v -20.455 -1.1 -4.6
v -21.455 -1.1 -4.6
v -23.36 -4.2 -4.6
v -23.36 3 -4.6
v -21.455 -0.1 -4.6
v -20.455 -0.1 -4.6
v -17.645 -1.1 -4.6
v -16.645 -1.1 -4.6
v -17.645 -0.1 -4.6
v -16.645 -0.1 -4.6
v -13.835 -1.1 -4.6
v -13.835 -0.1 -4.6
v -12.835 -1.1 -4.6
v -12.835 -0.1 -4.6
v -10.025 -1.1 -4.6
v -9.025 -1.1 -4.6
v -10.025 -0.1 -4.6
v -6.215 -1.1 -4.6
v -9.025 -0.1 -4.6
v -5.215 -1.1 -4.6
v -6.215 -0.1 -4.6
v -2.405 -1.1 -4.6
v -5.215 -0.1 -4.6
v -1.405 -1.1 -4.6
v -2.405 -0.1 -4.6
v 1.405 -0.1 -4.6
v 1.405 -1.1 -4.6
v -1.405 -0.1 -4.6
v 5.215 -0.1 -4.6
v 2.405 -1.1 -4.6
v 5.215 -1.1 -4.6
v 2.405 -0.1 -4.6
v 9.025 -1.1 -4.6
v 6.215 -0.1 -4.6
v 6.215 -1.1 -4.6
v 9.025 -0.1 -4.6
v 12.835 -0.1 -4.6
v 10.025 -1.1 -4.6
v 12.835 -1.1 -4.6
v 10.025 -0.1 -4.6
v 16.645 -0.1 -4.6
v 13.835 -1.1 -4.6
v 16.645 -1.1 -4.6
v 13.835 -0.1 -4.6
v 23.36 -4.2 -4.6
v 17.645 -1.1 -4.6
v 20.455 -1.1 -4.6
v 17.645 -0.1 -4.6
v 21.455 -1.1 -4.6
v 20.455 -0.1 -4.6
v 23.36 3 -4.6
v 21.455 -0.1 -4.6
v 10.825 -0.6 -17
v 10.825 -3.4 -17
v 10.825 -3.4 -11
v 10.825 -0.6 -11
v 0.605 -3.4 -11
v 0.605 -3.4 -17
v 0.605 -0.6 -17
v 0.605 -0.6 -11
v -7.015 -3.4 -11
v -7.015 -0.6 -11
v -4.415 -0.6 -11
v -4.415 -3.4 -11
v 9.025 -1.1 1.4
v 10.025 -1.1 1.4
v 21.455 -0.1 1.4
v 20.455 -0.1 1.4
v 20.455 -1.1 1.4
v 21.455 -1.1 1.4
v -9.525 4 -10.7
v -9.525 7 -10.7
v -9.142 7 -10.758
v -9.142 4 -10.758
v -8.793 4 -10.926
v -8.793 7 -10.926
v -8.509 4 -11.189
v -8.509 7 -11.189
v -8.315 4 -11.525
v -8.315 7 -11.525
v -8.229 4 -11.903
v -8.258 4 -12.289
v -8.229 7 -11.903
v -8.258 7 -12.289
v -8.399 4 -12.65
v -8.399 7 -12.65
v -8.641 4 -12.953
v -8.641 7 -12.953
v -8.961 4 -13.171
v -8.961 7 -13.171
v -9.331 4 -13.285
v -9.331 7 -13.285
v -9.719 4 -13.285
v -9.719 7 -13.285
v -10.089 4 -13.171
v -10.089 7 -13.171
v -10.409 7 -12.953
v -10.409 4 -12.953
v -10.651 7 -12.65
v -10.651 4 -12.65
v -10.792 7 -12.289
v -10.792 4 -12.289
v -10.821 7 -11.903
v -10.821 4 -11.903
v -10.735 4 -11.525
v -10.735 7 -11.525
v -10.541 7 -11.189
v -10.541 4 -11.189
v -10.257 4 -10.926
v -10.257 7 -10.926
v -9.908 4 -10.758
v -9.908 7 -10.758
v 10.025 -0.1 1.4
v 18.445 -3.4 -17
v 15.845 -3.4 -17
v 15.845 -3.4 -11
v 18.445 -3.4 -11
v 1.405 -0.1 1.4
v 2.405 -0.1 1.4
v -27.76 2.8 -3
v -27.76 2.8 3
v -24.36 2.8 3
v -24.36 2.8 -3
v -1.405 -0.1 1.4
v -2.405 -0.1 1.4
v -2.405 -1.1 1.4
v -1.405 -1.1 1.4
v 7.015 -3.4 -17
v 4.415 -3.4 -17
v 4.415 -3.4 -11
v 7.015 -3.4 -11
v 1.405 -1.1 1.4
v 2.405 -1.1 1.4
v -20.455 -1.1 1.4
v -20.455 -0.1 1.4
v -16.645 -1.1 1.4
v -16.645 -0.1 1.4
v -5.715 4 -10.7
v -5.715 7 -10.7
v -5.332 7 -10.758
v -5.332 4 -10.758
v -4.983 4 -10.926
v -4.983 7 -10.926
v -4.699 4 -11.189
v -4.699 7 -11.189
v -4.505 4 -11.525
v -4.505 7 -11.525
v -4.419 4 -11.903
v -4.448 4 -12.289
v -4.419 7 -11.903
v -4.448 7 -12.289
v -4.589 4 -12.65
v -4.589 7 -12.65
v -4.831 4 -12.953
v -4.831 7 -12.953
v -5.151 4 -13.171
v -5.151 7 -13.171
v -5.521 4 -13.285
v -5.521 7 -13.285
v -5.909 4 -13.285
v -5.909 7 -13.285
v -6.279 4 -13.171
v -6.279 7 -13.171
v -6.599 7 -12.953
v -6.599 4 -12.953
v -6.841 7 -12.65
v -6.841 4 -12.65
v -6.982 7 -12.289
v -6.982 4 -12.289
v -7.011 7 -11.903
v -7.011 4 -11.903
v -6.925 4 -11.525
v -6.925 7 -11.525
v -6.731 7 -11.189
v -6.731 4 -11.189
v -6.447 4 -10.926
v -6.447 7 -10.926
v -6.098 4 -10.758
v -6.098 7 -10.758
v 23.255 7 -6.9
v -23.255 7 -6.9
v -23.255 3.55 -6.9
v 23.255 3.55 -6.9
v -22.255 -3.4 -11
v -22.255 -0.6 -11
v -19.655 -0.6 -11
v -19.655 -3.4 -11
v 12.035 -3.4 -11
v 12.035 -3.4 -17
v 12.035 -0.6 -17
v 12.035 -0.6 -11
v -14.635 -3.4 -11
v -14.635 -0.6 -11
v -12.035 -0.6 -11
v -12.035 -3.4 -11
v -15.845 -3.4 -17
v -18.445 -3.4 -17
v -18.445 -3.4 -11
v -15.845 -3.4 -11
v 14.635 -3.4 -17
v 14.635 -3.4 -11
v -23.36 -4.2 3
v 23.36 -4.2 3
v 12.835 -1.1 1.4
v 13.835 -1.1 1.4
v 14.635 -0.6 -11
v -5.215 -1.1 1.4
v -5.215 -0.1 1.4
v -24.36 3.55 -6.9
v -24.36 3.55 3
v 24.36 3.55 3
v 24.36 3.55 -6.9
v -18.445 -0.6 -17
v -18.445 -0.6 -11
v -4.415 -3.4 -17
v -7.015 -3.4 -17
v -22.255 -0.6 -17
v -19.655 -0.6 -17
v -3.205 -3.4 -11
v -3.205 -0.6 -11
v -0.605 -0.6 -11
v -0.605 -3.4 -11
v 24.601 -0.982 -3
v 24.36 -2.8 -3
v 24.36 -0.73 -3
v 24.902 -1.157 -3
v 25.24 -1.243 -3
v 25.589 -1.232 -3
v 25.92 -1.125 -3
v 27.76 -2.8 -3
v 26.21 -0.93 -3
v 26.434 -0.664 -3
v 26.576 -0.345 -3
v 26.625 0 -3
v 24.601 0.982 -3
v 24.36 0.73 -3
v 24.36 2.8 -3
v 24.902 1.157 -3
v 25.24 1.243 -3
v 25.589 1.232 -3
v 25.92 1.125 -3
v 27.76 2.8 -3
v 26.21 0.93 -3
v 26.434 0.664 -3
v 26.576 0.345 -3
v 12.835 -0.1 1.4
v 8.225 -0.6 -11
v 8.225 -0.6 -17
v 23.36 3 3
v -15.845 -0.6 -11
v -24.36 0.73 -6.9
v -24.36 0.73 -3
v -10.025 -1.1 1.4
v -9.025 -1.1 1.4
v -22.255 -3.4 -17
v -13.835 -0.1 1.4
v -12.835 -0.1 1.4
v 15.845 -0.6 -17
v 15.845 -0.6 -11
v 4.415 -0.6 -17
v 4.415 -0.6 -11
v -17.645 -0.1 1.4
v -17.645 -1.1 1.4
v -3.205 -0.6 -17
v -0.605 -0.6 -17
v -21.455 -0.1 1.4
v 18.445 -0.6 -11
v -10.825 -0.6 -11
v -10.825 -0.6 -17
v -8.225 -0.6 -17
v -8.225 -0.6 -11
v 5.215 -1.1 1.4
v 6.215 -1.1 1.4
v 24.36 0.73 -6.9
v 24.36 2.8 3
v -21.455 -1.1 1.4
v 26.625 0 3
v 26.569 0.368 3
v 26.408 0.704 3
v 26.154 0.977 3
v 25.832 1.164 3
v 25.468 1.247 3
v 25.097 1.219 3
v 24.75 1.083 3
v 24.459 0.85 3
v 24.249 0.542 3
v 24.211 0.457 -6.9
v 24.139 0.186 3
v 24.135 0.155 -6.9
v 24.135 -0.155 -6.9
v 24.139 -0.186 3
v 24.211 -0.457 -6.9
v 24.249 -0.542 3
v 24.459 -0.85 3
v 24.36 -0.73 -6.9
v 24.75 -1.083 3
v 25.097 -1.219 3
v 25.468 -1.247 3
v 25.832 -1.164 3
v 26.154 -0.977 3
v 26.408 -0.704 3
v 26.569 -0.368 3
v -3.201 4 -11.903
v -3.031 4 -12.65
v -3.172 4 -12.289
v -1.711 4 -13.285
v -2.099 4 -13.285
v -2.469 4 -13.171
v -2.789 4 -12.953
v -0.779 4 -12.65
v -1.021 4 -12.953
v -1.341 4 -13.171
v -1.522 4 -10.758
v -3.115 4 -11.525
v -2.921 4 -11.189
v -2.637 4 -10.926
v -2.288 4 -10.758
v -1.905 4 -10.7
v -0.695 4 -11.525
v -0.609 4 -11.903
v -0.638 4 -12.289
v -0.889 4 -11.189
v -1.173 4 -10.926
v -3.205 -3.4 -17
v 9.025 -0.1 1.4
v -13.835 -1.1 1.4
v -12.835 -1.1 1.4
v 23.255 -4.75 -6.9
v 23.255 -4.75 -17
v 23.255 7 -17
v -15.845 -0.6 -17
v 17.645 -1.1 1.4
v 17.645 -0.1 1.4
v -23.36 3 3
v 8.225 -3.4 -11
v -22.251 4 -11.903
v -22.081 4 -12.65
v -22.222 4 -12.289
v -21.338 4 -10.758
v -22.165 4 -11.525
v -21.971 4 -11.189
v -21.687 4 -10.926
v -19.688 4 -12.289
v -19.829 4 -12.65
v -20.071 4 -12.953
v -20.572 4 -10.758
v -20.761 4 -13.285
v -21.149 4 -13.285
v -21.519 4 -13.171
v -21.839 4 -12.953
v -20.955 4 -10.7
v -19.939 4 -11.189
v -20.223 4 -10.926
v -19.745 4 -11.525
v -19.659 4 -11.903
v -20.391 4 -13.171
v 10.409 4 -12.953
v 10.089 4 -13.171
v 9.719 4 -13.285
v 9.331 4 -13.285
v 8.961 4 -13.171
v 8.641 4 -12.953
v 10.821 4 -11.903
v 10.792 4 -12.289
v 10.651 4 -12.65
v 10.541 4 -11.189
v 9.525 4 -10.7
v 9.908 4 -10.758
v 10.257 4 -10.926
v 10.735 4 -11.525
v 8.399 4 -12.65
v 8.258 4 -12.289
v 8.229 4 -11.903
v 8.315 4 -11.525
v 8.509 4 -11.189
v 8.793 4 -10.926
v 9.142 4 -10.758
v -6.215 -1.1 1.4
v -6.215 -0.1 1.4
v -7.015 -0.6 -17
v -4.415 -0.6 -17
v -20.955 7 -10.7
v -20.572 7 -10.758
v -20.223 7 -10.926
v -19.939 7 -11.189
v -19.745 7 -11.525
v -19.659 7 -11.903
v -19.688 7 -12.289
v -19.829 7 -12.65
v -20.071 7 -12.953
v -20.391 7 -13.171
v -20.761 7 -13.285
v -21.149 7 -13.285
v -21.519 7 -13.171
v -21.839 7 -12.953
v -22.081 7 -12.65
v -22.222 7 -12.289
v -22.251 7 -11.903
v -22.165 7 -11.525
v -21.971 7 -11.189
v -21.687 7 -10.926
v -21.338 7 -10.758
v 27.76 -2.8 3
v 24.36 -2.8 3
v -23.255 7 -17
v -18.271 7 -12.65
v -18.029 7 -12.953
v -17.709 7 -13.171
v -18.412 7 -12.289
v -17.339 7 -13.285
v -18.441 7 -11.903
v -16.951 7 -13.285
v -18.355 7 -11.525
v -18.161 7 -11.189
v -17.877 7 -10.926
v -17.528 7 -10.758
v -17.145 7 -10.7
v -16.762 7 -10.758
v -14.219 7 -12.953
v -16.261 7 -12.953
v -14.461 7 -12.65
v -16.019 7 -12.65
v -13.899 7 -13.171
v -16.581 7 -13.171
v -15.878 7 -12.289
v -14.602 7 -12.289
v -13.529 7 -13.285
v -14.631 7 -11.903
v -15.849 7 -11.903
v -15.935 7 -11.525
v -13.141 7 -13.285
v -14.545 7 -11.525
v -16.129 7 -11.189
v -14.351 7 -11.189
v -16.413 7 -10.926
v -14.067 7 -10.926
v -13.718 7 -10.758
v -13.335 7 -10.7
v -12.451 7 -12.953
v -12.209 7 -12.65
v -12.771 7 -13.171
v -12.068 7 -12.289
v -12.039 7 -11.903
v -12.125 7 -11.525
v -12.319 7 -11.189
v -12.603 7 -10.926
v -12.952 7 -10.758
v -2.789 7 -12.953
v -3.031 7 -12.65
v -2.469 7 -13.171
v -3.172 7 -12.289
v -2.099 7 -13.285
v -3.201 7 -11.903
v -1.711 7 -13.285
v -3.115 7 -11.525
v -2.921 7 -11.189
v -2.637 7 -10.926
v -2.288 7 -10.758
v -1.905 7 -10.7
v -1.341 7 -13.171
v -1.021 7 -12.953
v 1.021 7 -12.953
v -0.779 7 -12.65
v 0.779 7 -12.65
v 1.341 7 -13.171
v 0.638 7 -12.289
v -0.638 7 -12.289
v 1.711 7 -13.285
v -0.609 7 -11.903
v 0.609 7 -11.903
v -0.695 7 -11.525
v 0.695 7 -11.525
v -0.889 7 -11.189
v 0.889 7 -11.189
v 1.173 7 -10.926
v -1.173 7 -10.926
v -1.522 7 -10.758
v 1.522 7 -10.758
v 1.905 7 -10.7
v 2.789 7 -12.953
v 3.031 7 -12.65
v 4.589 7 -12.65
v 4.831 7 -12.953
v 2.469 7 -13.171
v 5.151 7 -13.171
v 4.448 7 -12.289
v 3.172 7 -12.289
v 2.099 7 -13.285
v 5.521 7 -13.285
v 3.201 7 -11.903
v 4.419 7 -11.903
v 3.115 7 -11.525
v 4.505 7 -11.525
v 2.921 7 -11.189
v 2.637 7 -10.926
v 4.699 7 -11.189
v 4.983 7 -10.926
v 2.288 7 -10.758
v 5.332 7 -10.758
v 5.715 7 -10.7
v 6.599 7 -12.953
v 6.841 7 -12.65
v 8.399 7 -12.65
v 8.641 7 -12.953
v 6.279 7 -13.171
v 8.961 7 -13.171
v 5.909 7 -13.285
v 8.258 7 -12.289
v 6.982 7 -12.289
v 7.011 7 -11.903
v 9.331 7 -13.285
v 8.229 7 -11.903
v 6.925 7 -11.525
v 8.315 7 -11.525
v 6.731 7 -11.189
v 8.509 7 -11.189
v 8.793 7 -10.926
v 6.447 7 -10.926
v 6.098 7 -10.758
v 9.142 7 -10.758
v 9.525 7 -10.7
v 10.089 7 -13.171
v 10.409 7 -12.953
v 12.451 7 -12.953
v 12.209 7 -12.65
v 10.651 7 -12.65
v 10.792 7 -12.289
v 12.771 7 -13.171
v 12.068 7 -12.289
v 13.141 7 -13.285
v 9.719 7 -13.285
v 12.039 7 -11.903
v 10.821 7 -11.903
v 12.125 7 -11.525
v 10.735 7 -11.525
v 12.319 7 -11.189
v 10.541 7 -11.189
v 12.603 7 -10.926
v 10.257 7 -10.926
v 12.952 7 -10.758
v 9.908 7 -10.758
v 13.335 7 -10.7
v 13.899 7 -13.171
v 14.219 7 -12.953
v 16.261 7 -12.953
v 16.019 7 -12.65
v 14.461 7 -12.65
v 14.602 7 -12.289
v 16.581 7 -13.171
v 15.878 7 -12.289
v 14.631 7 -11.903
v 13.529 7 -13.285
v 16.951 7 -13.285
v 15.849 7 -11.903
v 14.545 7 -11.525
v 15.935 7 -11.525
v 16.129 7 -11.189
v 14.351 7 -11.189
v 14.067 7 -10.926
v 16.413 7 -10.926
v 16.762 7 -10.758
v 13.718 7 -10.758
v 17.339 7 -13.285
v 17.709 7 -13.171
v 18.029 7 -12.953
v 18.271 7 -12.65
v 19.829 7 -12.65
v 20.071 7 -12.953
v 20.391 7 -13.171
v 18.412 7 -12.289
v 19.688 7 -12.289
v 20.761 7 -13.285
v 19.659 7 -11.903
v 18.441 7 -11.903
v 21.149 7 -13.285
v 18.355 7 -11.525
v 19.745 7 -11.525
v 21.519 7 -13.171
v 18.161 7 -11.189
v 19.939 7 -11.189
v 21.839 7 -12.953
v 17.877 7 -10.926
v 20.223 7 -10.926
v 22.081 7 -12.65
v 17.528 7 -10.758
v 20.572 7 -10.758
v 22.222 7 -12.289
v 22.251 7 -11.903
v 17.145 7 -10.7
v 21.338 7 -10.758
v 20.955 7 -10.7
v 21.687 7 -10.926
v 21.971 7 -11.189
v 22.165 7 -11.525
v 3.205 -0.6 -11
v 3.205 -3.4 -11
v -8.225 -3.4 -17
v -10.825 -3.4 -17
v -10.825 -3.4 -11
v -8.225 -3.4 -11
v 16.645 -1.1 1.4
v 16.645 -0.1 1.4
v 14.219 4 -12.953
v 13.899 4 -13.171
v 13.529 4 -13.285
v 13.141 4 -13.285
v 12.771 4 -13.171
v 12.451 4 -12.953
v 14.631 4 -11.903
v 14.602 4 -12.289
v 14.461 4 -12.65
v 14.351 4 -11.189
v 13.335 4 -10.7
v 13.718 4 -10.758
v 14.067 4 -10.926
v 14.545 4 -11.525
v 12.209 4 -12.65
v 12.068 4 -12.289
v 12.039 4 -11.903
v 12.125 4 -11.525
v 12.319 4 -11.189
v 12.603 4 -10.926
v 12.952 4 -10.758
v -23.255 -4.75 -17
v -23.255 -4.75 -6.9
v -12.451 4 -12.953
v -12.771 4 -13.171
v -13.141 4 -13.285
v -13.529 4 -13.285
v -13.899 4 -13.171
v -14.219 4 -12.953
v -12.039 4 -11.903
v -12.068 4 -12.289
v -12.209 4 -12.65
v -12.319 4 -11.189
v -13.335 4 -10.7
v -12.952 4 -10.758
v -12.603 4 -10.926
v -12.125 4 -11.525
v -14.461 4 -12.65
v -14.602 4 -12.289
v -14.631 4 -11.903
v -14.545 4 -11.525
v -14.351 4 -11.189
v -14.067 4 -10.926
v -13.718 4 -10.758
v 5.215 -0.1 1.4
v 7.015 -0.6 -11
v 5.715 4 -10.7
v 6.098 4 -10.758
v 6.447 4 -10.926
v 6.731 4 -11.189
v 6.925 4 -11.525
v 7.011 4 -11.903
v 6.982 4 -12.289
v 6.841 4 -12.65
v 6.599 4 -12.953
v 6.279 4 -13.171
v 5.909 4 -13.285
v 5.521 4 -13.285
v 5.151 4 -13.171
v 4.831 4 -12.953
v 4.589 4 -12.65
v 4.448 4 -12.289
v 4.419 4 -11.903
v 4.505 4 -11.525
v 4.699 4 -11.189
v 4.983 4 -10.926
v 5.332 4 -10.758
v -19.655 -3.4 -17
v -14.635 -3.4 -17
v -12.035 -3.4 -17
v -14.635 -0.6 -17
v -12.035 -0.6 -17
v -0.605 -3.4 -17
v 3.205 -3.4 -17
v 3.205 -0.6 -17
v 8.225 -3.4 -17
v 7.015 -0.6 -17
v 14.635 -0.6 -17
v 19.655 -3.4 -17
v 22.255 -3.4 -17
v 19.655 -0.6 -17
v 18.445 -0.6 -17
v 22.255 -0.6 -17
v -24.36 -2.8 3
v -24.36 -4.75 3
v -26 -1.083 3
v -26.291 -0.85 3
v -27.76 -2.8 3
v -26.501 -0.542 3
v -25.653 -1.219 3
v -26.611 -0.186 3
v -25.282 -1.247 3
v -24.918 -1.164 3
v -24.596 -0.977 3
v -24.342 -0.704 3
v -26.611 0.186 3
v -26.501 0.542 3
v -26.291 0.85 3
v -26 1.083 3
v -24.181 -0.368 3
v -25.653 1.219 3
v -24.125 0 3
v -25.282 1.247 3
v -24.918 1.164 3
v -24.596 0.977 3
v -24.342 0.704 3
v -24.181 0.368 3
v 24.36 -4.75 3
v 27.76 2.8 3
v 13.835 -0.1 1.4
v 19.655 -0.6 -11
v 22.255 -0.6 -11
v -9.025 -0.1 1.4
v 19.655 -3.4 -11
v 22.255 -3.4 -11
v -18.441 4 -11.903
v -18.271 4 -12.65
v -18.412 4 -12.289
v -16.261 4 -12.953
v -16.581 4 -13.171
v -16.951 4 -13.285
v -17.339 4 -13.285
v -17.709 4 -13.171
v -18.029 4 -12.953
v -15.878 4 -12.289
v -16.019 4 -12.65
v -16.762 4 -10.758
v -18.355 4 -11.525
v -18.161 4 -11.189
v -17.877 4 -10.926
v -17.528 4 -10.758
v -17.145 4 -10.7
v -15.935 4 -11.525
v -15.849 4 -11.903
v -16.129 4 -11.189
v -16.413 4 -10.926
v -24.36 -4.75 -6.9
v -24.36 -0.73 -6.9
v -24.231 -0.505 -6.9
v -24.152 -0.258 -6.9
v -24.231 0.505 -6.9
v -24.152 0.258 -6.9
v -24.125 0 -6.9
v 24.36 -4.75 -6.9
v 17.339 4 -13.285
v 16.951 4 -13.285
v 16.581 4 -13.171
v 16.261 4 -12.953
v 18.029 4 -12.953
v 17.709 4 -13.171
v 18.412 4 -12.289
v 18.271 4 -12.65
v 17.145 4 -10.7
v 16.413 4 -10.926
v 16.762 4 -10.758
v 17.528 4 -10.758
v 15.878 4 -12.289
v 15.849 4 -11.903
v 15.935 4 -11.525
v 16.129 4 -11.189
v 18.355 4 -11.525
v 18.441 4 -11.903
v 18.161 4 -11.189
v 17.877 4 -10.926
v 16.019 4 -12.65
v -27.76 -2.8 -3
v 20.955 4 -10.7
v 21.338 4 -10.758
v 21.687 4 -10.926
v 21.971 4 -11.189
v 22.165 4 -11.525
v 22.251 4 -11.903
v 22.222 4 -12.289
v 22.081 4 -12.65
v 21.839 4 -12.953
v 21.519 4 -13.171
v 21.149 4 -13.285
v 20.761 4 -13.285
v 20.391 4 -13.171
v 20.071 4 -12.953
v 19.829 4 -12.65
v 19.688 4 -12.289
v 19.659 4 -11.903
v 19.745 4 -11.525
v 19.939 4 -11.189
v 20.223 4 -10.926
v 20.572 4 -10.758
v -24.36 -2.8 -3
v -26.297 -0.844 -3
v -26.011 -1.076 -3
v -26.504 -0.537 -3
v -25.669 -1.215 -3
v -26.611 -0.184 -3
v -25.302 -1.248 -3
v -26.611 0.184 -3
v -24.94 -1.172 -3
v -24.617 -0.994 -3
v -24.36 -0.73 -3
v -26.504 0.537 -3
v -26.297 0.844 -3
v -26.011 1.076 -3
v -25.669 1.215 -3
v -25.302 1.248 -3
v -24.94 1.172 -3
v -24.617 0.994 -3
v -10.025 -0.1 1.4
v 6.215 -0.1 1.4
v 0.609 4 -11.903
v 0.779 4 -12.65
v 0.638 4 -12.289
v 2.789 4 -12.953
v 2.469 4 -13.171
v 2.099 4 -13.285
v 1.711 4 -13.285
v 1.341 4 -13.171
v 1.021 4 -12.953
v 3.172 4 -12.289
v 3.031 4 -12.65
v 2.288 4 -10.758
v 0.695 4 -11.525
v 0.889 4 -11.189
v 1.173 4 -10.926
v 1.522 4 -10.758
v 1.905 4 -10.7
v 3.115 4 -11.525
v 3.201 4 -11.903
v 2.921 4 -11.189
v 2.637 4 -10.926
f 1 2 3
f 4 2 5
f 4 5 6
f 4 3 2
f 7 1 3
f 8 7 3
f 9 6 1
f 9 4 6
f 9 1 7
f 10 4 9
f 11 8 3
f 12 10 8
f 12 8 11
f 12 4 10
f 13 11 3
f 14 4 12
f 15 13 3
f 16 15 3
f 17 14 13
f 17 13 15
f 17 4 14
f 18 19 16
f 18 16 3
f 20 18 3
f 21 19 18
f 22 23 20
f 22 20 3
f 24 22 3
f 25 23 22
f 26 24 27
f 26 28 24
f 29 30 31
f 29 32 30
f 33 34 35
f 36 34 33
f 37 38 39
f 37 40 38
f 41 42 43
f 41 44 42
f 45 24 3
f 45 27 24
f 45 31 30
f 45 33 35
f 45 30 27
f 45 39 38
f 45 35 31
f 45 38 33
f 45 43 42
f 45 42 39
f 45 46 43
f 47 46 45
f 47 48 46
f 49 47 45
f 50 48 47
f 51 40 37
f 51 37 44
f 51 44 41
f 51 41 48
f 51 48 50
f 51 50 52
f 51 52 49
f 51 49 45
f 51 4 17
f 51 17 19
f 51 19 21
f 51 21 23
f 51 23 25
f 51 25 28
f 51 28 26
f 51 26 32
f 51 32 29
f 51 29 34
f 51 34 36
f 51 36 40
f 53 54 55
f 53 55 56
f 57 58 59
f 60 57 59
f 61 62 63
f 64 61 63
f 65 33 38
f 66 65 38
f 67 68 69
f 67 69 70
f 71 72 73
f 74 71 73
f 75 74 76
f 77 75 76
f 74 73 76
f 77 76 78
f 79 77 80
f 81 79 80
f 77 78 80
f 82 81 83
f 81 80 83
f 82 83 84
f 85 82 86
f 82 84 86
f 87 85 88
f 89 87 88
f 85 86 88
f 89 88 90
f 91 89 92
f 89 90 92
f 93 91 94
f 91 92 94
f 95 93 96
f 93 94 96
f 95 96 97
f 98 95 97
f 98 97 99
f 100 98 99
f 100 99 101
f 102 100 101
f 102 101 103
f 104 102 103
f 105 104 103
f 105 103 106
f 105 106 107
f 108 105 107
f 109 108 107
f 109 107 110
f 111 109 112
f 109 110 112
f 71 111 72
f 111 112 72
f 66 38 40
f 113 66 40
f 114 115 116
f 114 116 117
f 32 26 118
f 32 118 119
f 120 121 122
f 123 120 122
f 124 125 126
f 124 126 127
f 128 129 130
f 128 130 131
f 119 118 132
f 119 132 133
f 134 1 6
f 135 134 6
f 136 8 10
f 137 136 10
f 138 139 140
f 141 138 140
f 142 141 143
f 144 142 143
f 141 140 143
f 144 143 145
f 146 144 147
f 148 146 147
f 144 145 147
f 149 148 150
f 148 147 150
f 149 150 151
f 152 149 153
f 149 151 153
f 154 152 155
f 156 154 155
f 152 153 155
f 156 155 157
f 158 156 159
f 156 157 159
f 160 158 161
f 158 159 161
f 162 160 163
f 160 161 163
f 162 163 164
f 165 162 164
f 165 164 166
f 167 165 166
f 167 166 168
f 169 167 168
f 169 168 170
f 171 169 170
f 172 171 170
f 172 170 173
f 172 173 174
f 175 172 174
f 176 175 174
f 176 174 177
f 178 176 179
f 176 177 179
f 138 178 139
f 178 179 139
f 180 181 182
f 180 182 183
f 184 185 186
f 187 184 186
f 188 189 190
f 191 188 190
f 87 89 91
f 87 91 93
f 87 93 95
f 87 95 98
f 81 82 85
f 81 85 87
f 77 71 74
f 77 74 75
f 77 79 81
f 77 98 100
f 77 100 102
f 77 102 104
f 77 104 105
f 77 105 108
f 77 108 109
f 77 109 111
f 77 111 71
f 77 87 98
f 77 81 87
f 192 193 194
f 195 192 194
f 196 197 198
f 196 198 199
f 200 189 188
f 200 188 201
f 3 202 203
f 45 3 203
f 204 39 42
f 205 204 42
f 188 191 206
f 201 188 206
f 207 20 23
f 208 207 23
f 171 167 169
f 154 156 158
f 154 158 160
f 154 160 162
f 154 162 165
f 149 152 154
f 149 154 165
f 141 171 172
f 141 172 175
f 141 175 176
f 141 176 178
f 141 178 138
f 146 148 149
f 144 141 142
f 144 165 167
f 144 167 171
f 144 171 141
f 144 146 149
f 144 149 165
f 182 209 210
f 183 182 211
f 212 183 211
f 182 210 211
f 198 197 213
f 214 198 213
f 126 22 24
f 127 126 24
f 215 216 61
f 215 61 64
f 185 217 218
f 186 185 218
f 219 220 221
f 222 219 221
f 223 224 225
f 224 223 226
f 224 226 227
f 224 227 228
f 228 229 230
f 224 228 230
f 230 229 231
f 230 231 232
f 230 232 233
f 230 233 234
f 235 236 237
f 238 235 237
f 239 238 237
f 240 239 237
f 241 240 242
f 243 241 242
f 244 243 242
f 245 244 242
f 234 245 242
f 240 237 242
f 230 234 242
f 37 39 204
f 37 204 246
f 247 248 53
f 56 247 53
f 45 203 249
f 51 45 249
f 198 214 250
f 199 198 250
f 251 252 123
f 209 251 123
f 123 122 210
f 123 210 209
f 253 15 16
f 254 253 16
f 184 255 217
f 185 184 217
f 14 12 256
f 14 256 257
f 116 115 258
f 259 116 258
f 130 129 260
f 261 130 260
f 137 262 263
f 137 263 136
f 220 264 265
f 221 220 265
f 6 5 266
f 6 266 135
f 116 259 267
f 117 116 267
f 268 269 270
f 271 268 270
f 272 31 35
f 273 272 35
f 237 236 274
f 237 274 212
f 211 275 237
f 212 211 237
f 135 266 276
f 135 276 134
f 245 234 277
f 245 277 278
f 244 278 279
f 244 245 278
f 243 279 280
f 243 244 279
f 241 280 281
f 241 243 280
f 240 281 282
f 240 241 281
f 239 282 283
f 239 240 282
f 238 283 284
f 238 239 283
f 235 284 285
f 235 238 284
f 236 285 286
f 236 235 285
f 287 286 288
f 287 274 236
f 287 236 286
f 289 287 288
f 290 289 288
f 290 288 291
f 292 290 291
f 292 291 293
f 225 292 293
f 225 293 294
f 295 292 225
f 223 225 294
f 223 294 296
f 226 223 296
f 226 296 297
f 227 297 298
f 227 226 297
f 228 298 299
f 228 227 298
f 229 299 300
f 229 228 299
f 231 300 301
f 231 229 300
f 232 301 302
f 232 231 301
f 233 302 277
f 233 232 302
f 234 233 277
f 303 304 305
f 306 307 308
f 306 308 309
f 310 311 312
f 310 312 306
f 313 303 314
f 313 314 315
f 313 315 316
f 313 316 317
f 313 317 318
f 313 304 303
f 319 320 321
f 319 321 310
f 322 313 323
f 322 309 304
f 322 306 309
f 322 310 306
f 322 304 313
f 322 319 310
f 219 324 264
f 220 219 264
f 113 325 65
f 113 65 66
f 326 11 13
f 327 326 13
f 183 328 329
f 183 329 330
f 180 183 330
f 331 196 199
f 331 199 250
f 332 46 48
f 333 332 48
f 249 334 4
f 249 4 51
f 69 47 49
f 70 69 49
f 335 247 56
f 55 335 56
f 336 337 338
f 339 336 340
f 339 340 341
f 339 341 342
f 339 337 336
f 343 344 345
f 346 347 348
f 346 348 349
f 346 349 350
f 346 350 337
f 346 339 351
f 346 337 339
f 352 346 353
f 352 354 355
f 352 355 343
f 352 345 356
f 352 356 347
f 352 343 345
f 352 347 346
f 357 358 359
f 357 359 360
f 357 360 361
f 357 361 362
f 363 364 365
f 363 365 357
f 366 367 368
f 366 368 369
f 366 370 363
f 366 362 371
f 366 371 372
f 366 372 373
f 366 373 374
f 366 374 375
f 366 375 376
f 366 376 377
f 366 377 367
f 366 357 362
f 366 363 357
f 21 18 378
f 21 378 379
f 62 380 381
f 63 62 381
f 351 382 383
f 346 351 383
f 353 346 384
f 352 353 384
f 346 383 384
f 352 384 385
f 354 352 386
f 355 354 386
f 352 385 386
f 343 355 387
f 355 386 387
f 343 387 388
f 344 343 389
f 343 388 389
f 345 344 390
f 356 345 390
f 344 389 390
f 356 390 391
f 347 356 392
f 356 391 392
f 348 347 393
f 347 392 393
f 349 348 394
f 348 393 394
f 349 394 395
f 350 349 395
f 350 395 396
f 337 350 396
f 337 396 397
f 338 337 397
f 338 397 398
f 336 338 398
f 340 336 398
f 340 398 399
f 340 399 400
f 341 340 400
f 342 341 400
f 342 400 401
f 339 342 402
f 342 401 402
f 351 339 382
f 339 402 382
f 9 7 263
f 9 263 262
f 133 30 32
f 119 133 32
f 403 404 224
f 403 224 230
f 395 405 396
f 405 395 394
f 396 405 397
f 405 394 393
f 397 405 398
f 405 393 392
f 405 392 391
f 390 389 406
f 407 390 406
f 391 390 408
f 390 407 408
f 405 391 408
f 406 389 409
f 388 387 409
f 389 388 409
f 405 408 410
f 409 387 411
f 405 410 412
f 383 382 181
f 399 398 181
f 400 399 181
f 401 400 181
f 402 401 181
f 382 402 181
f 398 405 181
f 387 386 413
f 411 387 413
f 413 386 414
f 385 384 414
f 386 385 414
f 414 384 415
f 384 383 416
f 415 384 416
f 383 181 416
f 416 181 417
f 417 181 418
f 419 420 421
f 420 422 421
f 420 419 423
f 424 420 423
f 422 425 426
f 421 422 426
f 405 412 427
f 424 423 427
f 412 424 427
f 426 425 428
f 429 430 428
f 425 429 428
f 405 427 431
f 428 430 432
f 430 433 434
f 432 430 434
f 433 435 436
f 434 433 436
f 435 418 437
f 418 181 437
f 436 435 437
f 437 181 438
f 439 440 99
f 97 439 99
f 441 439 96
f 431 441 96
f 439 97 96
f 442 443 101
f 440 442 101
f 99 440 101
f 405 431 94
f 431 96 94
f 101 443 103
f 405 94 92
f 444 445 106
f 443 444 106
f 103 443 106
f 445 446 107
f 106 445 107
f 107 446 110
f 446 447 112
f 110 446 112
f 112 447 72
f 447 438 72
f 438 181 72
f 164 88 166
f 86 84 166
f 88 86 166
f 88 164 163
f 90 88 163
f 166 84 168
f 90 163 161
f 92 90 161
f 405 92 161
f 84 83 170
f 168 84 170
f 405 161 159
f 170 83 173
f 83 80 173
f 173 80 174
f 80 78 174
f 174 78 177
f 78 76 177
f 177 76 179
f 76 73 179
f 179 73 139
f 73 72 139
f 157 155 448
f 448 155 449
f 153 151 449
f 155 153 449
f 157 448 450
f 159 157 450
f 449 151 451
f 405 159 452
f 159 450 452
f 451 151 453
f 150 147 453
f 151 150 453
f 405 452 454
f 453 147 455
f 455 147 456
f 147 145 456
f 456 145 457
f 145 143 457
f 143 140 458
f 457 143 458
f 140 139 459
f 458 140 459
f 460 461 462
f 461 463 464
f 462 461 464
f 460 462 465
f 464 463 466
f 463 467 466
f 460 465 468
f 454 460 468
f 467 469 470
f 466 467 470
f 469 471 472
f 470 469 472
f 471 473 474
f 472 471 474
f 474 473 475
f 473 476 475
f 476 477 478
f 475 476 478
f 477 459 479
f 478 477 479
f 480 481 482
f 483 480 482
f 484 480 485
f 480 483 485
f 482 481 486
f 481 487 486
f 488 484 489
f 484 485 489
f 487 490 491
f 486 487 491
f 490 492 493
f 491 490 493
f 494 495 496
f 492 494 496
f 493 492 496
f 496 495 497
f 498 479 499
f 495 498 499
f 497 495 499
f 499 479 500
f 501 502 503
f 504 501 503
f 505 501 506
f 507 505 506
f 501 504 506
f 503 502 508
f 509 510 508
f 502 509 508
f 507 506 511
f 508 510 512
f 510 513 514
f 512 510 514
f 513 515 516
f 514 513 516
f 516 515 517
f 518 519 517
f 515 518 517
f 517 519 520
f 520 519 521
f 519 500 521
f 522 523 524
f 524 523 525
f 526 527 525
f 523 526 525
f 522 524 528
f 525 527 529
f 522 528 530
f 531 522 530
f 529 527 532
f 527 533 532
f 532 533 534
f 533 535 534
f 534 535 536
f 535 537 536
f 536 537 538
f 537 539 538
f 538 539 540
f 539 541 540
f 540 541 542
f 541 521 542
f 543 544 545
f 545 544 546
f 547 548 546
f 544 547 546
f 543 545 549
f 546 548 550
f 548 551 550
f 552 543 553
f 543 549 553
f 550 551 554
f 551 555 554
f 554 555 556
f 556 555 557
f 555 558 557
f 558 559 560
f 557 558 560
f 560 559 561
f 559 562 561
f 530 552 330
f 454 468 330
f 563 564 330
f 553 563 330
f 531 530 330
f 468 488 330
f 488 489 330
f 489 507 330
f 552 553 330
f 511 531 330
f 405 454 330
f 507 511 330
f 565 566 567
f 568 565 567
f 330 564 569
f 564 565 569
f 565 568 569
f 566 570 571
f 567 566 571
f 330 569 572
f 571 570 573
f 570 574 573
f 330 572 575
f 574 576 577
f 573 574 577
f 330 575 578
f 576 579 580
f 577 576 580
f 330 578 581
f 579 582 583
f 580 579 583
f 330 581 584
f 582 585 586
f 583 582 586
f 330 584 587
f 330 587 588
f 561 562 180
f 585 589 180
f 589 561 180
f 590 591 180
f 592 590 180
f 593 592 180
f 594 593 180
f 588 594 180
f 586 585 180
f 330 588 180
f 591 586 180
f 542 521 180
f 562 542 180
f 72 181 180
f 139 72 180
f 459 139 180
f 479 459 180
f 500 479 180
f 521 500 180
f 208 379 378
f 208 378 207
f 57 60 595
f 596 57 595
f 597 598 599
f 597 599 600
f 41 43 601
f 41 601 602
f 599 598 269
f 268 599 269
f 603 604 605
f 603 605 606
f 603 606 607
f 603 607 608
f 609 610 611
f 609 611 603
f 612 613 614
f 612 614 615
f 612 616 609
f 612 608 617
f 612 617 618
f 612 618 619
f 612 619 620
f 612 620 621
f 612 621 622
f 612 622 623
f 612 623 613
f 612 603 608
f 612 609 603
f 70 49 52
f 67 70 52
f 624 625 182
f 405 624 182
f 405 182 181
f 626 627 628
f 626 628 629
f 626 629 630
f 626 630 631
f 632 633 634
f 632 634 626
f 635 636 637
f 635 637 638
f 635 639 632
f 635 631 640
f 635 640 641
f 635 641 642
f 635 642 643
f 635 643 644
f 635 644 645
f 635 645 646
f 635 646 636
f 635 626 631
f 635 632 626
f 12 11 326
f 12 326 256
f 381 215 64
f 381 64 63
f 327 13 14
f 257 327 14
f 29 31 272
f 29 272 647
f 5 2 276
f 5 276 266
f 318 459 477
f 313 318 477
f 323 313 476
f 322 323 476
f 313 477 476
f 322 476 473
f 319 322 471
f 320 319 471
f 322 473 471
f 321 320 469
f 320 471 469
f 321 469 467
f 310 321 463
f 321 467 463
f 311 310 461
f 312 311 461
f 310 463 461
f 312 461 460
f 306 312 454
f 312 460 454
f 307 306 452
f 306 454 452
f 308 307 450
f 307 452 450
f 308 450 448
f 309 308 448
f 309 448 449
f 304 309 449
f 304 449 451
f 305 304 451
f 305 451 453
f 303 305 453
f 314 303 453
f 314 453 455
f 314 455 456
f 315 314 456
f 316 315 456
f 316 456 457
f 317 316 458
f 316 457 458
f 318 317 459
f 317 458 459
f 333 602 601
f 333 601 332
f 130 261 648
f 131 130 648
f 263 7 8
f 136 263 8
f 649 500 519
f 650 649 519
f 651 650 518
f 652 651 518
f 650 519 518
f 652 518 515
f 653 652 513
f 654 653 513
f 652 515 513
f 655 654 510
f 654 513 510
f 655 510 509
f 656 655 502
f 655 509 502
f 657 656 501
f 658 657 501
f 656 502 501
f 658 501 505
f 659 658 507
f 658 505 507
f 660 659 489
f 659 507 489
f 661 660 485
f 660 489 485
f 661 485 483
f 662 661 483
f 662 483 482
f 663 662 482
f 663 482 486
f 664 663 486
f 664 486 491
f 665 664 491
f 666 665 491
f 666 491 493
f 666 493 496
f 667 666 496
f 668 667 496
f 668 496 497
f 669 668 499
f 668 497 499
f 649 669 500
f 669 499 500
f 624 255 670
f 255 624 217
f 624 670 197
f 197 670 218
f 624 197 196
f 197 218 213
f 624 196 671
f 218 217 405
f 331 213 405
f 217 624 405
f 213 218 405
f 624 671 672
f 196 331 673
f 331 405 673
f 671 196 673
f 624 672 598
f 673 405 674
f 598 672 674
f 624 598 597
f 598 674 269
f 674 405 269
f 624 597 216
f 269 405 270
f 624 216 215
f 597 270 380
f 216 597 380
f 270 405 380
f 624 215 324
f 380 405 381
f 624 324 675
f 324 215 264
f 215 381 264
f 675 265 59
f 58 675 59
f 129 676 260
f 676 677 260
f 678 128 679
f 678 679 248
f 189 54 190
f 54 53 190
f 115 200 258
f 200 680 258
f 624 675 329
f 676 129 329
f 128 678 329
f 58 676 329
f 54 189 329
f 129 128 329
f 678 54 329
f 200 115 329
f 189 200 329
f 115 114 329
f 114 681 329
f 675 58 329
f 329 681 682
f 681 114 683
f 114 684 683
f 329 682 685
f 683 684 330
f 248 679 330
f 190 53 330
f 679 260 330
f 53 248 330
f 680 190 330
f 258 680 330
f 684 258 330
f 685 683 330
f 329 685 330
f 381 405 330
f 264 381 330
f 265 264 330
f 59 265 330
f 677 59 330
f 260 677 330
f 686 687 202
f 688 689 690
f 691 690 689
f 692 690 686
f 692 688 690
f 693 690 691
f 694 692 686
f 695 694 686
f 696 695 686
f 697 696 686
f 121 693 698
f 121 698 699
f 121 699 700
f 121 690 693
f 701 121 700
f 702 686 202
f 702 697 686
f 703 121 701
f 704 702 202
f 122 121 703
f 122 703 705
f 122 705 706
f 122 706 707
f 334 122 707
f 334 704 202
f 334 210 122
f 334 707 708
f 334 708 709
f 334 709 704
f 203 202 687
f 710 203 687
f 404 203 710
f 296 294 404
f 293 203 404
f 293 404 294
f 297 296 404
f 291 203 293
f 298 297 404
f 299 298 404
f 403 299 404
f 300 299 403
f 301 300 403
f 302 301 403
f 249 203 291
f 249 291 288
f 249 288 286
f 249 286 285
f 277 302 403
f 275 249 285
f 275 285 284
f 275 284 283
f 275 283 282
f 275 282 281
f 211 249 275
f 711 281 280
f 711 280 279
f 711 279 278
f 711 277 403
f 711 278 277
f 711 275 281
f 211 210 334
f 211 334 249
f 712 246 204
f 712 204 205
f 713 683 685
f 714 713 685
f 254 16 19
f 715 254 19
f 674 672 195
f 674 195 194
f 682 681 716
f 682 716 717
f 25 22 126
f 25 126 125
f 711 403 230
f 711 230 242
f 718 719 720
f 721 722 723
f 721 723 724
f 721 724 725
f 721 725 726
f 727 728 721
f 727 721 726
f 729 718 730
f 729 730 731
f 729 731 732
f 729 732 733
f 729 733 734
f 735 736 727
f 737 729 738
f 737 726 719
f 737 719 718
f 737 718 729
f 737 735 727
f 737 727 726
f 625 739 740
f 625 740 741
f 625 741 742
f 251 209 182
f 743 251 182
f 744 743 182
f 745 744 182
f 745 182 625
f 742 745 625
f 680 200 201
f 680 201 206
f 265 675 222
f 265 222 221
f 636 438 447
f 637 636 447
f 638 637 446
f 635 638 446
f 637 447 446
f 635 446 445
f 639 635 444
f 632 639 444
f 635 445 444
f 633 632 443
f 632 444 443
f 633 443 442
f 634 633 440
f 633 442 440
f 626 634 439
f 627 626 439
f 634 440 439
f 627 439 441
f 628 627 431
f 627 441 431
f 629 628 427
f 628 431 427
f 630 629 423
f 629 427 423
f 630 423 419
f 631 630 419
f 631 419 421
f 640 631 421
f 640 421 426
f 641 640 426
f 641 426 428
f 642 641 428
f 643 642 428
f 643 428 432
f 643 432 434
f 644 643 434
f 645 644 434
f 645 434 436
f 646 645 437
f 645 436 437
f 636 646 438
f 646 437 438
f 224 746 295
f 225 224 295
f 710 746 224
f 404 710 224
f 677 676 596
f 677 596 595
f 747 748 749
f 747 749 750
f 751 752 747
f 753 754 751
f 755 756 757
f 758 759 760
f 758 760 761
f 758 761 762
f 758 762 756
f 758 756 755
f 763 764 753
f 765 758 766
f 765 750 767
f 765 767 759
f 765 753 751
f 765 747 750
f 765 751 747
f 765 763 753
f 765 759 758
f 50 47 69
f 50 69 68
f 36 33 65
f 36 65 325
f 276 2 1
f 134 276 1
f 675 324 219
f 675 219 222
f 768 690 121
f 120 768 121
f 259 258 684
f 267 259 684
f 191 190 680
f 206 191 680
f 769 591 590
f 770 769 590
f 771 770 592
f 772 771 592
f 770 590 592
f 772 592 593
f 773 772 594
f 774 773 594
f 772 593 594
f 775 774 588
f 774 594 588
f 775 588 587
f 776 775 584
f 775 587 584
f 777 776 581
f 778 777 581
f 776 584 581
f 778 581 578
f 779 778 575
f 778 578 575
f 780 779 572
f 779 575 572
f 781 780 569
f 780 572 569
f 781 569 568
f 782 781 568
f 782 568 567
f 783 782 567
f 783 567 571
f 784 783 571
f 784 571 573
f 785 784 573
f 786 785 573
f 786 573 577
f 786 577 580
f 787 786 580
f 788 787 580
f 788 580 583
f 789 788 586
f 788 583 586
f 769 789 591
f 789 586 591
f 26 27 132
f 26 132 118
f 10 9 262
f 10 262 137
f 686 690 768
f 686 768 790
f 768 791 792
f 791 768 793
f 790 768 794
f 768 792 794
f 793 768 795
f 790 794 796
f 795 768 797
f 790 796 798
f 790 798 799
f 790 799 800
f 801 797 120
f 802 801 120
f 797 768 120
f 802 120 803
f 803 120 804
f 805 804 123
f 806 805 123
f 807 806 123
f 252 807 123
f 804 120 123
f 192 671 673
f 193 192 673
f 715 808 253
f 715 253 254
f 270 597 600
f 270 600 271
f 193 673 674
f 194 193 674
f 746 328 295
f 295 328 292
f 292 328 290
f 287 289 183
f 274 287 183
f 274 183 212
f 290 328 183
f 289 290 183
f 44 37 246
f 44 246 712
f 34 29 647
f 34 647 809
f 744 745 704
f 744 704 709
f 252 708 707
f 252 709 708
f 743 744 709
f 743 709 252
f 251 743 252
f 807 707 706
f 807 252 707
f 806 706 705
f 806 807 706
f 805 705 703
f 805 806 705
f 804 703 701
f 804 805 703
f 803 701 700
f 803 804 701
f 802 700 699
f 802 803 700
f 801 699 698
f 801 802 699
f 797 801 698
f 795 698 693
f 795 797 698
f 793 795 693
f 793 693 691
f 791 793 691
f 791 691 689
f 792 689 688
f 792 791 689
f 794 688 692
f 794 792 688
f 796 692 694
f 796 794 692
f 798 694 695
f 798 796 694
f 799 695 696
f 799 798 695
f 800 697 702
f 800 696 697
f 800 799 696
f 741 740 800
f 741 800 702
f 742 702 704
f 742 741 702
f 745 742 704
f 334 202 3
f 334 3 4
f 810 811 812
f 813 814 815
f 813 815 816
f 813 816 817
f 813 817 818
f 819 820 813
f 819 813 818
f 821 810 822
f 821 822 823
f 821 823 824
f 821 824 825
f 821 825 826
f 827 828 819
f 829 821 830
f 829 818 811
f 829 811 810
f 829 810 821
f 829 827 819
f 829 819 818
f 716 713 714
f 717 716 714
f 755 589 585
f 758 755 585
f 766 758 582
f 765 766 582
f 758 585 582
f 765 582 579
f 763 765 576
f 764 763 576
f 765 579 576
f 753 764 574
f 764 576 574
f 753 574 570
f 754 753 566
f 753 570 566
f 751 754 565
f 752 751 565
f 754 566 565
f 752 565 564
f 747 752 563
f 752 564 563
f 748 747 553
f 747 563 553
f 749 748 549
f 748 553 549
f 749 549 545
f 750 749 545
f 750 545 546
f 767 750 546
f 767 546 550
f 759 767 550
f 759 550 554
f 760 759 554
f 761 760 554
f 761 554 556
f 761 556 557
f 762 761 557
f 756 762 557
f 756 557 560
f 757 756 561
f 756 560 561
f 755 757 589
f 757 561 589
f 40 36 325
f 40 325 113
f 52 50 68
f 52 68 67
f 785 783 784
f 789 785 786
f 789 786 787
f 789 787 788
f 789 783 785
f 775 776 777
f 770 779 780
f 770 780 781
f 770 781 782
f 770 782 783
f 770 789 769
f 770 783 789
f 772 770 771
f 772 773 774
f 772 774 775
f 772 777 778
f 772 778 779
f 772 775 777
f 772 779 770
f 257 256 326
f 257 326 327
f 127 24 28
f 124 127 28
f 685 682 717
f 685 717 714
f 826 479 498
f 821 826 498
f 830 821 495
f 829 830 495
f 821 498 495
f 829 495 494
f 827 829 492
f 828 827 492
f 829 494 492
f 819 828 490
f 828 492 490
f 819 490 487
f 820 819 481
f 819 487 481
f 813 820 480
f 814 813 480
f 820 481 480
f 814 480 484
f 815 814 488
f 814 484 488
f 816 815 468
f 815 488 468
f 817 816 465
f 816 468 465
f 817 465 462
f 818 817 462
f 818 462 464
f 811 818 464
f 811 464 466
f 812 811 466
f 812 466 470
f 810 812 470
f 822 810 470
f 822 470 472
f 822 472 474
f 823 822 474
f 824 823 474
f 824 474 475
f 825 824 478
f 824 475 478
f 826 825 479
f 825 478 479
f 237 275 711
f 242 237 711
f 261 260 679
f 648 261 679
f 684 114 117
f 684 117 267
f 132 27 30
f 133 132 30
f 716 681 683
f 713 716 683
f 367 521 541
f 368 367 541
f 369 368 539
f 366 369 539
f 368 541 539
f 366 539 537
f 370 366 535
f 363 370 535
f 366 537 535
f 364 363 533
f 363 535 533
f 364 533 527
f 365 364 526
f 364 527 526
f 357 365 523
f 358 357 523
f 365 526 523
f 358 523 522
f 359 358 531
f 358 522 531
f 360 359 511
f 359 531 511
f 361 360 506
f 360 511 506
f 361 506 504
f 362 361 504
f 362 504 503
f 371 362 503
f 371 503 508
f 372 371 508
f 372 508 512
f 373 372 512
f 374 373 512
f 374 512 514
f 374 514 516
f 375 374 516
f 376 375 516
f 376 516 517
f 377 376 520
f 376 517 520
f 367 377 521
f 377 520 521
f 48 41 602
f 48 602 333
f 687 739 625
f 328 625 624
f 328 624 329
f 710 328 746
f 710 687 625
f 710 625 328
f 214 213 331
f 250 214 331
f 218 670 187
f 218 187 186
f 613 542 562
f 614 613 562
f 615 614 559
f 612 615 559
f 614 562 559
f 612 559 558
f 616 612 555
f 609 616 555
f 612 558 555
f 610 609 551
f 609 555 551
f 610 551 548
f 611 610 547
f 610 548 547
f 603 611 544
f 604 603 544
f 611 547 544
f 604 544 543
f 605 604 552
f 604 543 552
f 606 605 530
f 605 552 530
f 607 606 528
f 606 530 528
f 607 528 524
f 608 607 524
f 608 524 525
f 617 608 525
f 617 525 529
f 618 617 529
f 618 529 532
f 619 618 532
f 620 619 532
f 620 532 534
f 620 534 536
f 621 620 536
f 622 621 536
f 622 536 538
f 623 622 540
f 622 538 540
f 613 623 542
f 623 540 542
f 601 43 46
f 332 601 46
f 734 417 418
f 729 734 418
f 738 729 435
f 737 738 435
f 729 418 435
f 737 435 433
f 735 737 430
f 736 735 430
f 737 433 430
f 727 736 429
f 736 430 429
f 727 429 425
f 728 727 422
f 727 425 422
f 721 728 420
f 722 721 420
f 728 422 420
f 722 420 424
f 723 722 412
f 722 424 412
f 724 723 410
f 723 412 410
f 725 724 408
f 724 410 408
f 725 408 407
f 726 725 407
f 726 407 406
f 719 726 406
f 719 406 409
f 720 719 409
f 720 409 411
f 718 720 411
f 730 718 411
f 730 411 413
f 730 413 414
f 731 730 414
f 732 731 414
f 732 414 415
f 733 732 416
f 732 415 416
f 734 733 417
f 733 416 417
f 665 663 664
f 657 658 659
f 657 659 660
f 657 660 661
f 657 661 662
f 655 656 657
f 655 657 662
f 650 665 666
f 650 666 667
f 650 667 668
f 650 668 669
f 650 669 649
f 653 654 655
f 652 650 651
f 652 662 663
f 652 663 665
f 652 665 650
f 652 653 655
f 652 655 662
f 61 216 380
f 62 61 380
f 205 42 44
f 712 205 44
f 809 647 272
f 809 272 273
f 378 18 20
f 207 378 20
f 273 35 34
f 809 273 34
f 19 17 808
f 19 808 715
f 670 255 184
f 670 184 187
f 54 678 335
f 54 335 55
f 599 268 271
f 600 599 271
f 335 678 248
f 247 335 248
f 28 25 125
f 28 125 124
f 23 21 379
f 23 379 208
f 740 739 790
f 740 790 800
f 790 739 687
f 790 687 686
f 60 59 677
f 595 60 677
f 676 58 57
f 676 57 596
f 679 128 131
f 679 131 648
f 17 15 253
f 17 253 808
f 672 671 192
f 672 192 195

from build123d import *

# Parameters (mm, degrees)
SK_SHROUD_W             = 48.72
SK_SHROUD_H             = 8.3
SHROUD_DEPTH            = 9.9
SK_FLANGE_EARS_W        = 3.4
SK_FLANGE_EARS_H        = 5.6
FLANGE_EARS_DEPTH       = 6
SK_CAVITY_W             = 46.72
SK_CAVITY_H             = 7.2
CAVITY_DEPTH            = 7.6
SK_TERMINAL_BLOCK_W     = 46.51
SK_TERMINAL_BLOCK_H     = 11.75
TERMINAL_BLOCK_DEPTH    = 10.1
INSERT_HOLES_DEPTH      = 34.295909659
INSERT_HOLES_DEPTH_BACK = 34.295909659
SK_INSERT_HOLES_R       = 1.25
SK_CONTACT_PINS_W       = 1
SK_CONTACT_PINS_H       = 1
CONTACT_PINS_DEPTH      = 6
SK_WIRE_ENTRIES_W       = 2.6
SK_WIRE_ENTRIES_H       = 2.8
WIRE_ENTRIES_DEPTH      = 6
SK_CLAMP_SCREW_HOLES_R  = 1.3
CLAMP_SCREW_HOLES_DEPTH = 3


with BuildPart() as part:
    # SK Shroud → Shroud (new body)
    with BuildSketch(Plane.XY.offset(3)):
        with Locations((0, -0.6)):
            Rectangle(SK_SHROUD_W, SK_SHROUD_H)
    extrude(amount=-SHROUD_DEPTH)

    # SK Flange ears → Flange ears (add)
    with BuildSketch(Plane.XY.offset(3)):
        with Locations((26.06, 0)):
            Rectangle(SK_FLANGE_EARS_W, SK_FLANGE_EARS_H)
        with Locations((-26.06, 0)):
            Rectangle(SK_FLANGE_EARS_W, SK_FLANGE_EARS_H)
    extrude(amount=-FLANGE_EARS_DEPTH)

    # SK Cavity → Cavity (cut)
    with BuildSketch(Plane.XY.offset(3)):
        with Locations((0, -0.6)):
            Rectangle(SK_CAVITY_W, SK_CAVITY_H)
    extrude(amount=-CAVITY_DEPTH, mode=Mode.SUBTRACT)

    # SK Terminal block → Terminal block (add)
    with BuildSketch(Plane.XY.offset(-6.9)):
        with Locations((0, 1.125)):
            Rectangle(SK_TERMINAL_BLOCK_W, SK_TERMINAL_BLOCK_H)
    extrude(amount=-TERMINAL_BLOCK_DEPTH)

    # SK Insert holes → Insert holes (cut, two sides: drawn at the far end of the back side and taken through both)
    with BuildSketch(Plane.XY.offset(-INSERT_HOLES_DEPTH_BACK)):
        with Locations((-25.375, 0)):
            Circle(SK_INSERT_HOLES_R)
        with Locations((25.375, 0)):
            Circle(SK_INSERT_HOLES_R)
    extrude(amount=INSERT_HOLES_DEPTH + INSERT_HOLES_DEPTH_BACK, mode=Mode.SUBTRACT)

    # SK Contact pins → Contact pins (add)
    with BuildSketch(Plane.XY.offset(-4.6)):
        with Locations((-20.955, -0.6)):
            Rectangle(SK_CONTACT_PINS_W, SK_CONTACT_PINS_H)
        with Locations((-17.145, -0.6)):
            Rectangle(SK_CONTACT_PINS_W, SK_CONTACT_PINS_H)
        with Locations((-13.335, -0.6)):
            Rectangle(SK_CONTACT_PINS_W, SK_CONTACT_PINS_H)
        with Locations((-9.525, -0.6)):
            Rectangle(SK_CONTACT_PINS_W, SK_CONTACT_PINS_H)
        with Locations((-5.715, -0.6)):
            Rectangle(SK_CONTACT_PINS_W, SK_CONTACT_PINS_H)
        with Locations((-1.905, -0.6)):
            Rectangle(SK_CONTACT_PINS_W, SK_CONTACT_PINS_H)
        with Locations((1.905, -0.6)):
            Rectangle(SK_CONTACT_PINS_W, SK_CONTACT_PINS_H)
        with Locations((5.715, -0.6)):
            Rectangle(SK_CONTACT_PINS_W, SK_CONTACT_PINS_H)
        with Locations((9.525, -0.6)):
            Rectangle(SK_CONTACT_PINS_W, SK_CONTACT_PINS_H)
        with Locations((13.335, -0.6)):
            Rectangle(SK_CONTACT_PINS_W, SK_CONTACT_PINS_H)
        with Locations((17.145, -0.6)):
            Rectangle(SK_CONTACT_PINS_W, SK_CONTACT_PINS_H)
        with Locations((20.955, -0.6)):
            Rectangle(SK_CONTACT_PINS_W, SK_CONTACT_PINS_H)
    extrude(amount=CONTACT_PINS_DEPTH)

    # SK Wire entries → Wire entries (cut)
    with BuildSketch(Plane.XY.offset(-17)):
        with Locations((-20.955, -2)):
            Rectangle(SK_WIRE_ENTRIES_W, SK_WIRE_ENTRIES_H)
        with Locations((-17.145, -2)):
            Rectangle(SK_WIRE_ENTRIES_W, SK_WIRE_ENTRIES_H)
        with Locations((-13.335, -2)):
            Rectangle(SK_WIRE_ENTRIES_W, SK_WIRE_ENTRIES_H)
        with Locations((-9.525, -2)):
            Rectangle(SK_WIRE_ENTRIES_W, SK_WIRE_ENTRIES_H)
        with Locations((-5.715, -2)):
            Rectangle(SK_WIRE_ENTRIES_W, SK_WIRE_ENTRIES_H)
        with Locations((-1.905, -2)):
            Rectangle(SK_WIRE_ENTRIES_W, SK_WIRE_ENTRIES_H)
        with Locations((1.905, -2)):
            Rectangle(SK_WIRE_ENTRIES_W, SK_WIRE_ENTRIES_H)
        with Locations((5.715, -2)):
            Rectangle(SK_WIRE_ENTRIES_W, SK_WIRE_ENTRIES_H)
        with Locations((9.525, -2)):
            Rectangle(SK_WIRE_ENTRIES_W, SK_WIRE_ENTRIES_H)
        with Locations((13.335, -2)):
            Rectangle(SK_WIRE_ENTRIES_W, SK_WIRE_ENTRIES_H)
        with Locations((17.145, -2)):
            Rectangle(SK_WIRE_ENTRIES_W, SK_WIRE_ENTRIES_H)
        with Locations((20.955, -2)):
            Rectangle(SK_WIRE_ENTRIES_W, SK_WIRE_ENTRIES_H)
    extrude(amount=WIRE_ENTRIES_DEPTH, mode=Mode.SUBTRACT)

    # SK Clamp screw holes → Clamp screw holes (cut)
    with BuildSketch(Plane(origin=(0, 7, 0), x_dir=(1, 0, 0), z_dir=(0, 1, 0))):
        with Locations(Location((-20.955, 12, 0), (0, 0, 270))):
            Circle(SK_CLAMP_SCREW_HOLES_R)
        with Locations(Location((-17.145, 12, 0), (0, 0, 270))):
            Circle(SK_CLAMP_SCREW_HOLES_R)
        with Locations(Location((-13.335, 12, 0), (0, 0, 270))):
            Circle(SK_CLAMP_SCREW_HOLES_R)
        with Locations(Location((-9.525, 12, 0), (0, 0, 270))):
            Circle(SK_CLAMP_SCREW_HOLES_R)
        with Locations(Location((-5.715, 12, 0), (0, 0, 270))):
            Circle(SK_CLAMP_SCREW_HOLES_R)
        with Locations(Location((-1.905, 12, 0), (0, 0, 270))):
            Circle(SK_CLAMP_SCREW_HOLES_R)
        with Locations(Location((1.905, 12, 0), (0, 0, 270))):
            Circle(SK_CLAMP_SCREW_HOLES_R)
        with Locations(Location((5.715, 12, 0), (0, 0, 270))):
            Circle(SK_CLAMP_SCREW_HOLES_R)
        with Locations(Location((9.525, 12, 0), (0, 0, 270))):
            Circle(SK_CLAMP_SCREW_HOLES_R)
        with Locations(Location((13.335, 12, 0), (0, 0, 270))):
            Circle(SK_CLAMP_SCREW_HOLES_R)
        with Locations(Location((17.145, 12, 0), (0, 0, 270))):
            Circle(SK_CLAMP_SCREW_HOLES_R)
        with Locations(Location((20.955, 12, 0), (0, 0, 270))):
            Circle(SK_CLAMP_SCREW_HOLES_R)
    extrude(amount=-CLAMP_SCREW_HOLES_DEPTH, mode=Mode.SUBTRACT)


solid = part.part
